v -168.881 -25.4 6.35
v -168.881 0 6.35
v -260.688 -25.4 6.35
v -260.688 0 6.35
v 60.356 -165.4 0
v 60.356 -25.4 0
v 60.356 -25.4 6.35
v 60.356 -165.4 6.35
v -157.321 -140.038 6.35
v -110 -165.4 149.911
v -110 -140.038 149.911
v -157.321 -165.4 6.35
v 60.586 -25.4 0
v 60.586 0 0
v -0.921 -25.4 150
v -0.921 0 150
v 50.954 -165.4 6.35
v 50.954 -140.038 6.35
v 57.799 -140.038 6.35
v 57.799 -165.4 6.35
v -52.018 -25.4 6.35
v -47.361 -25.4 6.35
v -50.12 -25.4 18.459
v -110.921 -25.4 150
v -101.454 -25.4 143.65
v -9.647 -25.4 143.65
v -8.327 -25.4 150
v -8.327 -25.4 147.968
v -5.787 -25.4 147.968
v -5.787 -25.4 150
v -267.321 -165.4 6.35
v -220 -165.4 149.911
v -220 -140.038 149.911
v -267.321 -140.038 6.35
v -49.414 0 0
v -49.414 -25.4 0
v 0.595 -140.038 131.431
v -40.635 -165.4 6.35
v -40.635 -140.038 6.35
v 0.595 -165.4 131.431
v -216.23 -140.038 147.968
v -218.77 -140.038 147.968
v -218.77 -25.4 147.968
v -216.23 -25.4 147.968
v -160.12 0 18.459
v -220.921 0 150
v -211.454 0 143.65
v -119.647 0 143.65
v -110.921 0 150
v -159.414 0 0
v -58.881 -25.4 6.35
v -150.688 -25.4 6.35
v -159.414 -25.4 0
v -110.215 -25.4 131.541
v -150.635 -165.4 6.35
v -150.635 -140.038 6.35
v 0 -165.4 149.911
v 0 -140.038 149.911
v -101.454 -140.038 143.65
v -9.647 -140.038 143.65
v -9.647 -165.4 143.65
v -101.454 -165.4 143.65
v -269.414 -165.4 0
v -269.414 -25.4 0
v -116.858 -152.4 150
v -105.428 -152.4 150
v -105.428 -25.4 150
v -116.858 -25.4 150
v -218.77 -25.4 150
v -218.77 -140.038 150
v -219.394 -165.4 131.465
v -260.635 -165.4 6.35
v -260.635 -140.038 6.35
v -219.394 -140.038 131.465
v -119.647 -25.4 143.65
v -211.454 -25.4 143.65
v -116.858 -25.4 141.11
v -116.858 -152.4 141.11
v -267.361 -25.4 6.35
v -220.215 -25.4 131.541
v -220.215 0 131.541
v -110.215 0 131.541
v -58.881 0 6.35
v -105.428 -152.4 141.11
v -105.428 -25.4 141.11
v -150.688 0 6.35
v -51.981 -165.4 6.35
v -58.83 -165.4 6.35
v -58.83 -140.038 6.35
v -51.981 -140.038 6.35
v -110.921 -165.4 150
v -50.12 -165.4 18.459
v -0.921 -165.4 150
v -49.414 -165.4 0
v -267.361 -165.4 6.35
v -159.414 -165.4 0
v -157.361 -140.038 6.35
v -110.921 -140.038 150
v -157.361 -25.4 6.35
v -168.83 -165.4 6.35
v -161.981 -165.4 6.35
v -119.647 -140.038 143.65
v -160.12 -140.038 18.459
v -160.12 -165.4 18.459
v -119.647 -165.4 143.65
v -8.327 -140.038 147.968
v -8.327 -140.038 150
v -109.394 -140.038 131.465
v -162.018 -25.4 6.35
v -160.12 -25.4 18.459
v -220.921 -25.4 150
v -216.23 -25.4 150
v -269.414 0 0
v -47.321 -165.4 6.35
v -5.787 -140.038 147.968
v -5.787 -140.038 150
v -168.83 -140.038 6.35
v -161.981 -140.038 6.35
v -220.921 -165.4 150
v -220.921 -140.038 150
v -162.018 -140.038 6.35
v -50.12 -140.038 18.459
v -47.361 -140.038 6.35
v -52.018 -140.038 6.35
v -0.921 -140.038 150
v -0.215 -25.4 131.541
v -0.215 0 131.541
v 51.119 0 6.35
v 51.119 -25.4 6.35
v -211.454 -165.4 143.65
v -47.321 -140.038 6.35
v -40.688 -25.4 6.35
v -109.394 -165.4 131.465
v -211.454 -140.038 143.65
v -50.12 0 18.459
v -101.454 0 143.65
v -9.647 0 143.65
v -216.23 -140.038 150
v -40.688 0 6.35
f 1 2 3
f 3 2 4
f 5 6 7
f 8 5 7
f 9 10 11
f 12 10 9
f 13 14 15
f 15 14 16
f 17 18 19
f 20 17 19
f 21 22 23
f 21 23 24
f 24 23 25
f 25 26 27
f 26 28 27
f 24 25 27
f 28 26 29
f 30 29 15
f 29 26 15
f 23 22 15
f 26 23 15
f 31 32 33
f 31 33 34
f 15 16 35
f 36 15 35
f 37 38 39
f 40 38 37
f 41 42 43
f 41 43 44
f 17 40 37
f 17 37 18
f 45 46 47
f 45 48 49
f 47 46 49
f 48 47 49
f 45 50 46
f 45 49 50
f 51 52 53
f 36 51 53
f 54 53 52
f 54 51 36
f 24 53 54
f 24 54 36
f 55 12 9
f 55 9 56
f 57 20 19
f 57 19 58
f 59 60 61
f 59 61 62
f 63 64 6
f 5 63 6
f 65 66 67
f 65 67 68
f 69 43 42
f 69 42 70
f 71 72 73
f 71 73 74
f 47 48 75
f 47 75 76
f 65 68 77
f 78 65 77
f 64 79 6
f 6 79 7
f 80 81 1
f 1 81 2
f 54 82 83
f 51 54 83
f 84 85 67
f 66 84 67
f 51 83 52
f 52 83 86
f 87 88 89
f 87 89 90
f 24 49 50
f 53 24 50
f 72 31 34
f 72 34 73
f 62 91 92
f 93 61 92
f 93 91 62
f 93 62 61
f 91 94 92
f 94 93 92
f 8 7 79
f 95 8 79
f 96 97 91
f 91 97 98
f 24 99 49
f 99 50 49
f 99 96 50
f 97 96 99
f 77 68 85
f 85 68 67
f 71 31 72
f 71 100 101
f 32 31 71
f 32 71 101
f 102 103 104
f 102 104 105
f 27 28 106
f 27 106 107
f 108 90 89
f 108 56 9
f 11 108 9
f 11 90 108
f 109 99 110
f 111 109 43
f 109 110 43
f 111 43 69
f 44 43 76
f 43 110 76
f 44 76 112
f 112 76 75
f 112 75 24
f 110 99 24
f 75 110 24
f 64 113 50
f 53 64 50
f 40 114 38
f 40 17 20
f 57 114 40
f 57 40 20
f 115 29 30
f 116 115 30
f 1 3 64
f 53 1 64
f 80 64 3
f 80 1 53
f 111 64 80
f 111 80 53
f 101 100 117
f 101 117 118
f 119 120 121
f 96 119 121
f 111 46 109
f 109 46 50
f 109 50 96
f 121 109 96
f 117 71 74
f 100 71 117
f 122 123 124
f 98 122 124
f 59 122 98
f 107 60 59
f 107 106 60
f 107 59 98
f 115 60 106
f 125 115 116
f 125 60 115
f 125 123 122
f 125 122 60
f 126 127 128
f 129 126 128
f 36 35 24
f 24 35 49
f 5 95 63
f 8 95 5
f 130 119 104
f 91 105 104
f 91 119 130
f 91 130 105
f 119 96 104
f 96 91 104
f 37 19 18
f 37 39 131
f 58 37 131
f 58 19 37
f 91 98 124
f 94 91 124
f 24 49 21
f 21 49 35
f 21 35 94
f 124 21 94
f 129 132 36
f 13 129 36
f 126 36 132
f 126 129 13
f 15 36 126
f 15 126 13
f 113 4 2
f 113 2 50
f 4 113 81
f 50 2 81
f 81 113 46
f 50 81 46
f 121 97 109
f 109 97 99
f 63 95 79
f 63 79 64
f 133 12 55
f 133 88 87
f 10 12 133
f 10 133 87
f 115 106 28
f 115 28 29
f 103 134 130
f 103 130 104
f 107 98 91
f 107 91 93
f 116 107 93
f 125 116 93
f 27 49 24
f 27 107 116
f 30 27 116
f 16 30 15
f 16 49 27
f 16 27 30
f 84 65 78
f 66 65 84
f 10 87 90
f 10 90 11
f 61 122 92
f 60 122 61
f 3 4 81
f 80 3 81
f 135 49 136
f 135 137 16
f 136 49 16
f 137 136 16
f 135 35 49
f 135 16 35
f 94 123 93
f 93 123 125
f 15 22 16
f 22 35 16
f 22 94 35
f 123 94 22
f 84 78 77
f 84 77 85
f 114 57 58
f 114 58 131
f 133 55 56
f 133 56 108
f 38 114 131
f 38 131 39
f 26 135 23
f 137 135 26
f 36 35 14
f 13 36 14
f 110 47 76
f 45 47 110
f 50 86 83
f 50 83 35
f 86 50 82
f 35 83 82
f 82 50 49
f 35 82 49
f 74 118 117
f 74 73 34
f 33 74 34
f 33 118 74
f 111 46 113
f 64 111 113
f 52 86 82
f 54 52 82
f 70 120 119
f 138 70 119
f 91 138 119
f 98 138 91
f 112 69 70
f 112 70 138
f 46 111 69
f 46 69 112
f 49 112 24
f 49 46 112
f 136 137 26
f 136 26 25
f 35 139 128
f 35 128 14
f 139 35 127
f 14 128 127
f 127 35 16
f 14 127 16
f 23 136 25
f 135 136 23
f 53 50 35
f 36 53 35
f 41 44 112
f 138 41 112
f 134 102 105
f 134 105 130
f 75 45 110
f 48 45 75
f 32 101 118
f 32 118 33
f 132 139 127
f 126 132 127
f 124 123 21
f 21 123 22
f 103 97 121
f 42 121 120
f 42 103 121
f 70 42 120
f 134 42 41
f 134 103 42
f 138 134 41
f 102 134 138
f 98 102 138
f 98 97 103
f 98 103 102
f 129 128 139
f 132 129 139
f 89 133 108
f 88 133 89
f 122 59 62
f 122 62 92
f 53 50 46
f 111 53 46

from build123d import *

# Parameters (mm, degrees)
F1_DEPTH  = 25.4
F3_DEPTH  = 140
F5_DEPTH  = 25.4
F6_DEPTH  = 165.4
F7_T      = -6.35
F7_2_T    = -6.35
F8_W      = 114.6380283594
F8_H      = 145.7706200123
F9_DEPTH  = 333
F10_W     = 2.54
F10_H     = 2.032
F11_DEPTH = 127
F13_DEPTH = 127
F14_W     = 2.54
F14_H     = 2.032
F15_DEPTH = 127


with BuildPart() as f1:
    # F0 (on Front) → F1 (new body)
    with BuildSketch(Plane.XZ):
        Polygon((-220.9205039681, 150), (-269.4142203802, 0), (-159.4142203802, 0), align=None)
        Polygon((-260.6877224035, 6.35), (-220.2145848766, 131.5408716885), (-168.8810831653, 6.35), align=None, mode=Mode.SUBTRACT)
    extrude(amount=F1_DEPTH)


with BuildPart() as f1b:
    # F0 (on Front) → F1, piece 2 (new body)
    with BuildSketch(Plane.XZ):
        Polygon((-110.9205039681, 150), (-159.4142203802, 0), (-49.4142203802, 0), align=None)
        Polygon((-58.8810831653, 6.35), (-150.6877224035, 6.35), (-110.2145848766, 131.5408716885), align=None, mode=Mode.SUBTRACT)
    extrude(amount=F1_DEPTH)


with BuildPart() as f1c:
    # F0 (on Front) → F1, piece 3 (new body)
    with BuildSketch(Plane.XZ):
        Polygon((-0.9205039681, 150), (-49.4142203802, 0), (60.5857796198, 0), align=None)
        Polygon((-40.6877224035, 6.35), (-0.2145848766, 131.5408716885), (51.1189168347, 6.35), align=None, mode=Mode.SUBTRACT)
    extrude(amount=F1_DEPTH)


with BuildPart() as f3:
    # F2 (on face) → F3 (new body)
    with BuildSketch(Plane.XZ.offset(25.4)):
        Polygon((-267.3613197188, 6.35), (-269.4142203802, 0), (-159.4142203802, 0), (-162.0179863854, 6.35), (-168.8810831653, 6.35), (-260.6877224035, 6.35), align=None)
        Polygon((-162.0179863854, 6.35), (-159.4142203802, 0), (60.3559166193, 0), (60.3559166193, 6.35), align=None)
    extrude(amount=F3_DEPTH)


with BuildPart() as f5:
    # F4 (on face) → F5 (new body)
    with BuildSketch(Plane.XZ.offset(165.4)):
        Polygon((-220, 149.9108), (-267.3211070127, 6.35), (-260.6350301683, 6.35), (-219.3941436498, 131.4648807595), (-168.829523937, 6.35), (-161.9805444915, 6.35), align=None)
    extrude(amount=-F5_DEPTH)


with BuildPart() as f5b:
    # F4 (on face) → F5, piece 2 (new body)
    with BuildSketch(Plane.XZ.offset(165.4)):
        Polygon((-110, 149.9108), (-157.3211070127, 6.35), (-150.6350301683, 6.35), (-109.3941436498, 131.4648807595), (-58.829523937, 6.35), (-51.9805444915, 6.35), align=None)
    extrude(amount=-F5_DEPTH)


with BuildPart() as f5c:
    # F4 (on face) → F5, piece 3 (new body)
    with BuildSketch(Plane.XZ.offset(165.4)):
        Polygon((0, 149.9108), (-47.3211070127, 6.35), (-40.6350301683, 6.35), (0.5947637896, 131.431228612), (50.953992109, 6.35), (57.7993291651, 6.35), align=None)
    extrude(amount=-F5_DEPTH)


with BuildPart() as f6:
    # F0 (on Front) → F6 (new body, through all)
    with BuildSketch(Plane.XZ):
        Polygon((-110.9205039681, 150), (-220.9205039681, 150), (-159.4142203802, 0), align=None)
    extrude(amount=F6_DEPTH)

    # F7
    f7_openings = [f6.faces().sort_by_distance(p)[0] for p in [
        (-163.751743, -165.4, 100),
        (-163.751743, 0, 100),
    ]]
    offset(amount=F7_T, openings=f7_openings)


with BuildPart() as f6b:
    # F0 (on Front) → F6, piece 2 (new body, through all)
    with BuildSketch(Plane.XZ):
        Polygon((-0.9205039681, 150), (-110.9205039681, 150), (-49.4142203802, 0), align=None)
    extrude(amount=F6_DEPTH)

    # F7#2
    f7_2_openings = [f6b.faces().sort_by_distance(p)[0] for p in [
        (-53.751743, -165.4, 100),
        (-53.751743, 0, 100),
    ]]
    offset(amount=F7_2_T, openings=f7_2_openings)


with BuildPart() as f9_tool:
    # F8 (on face) → F9 (new body)
    with BuildSketch(Plane.YZ.offset(60.3559166193)):
        with Locations((-82.7190141797, 79.2353100061)):
            Rectangle(F8_W, F8_H)
    extrude(amount=-F9_DEPTH)


with BuildPart() as f5_1:
    add(f5.part)

    # F9: cut by f9_tool
    add(f9_tool.part, mode=Mode.SUBTRACT)


with BuildPart() as f5b_1:
    add(f5b.part)

    # F9: cut by f9_tool
    add(f9_tool.part, mode=Mode.SUBTRACT)


with BuildPart() as f5c_1:
    add(f5c.part)

    # F9: cut by f9_tool
    add(f9_tool.part, mode=Mode.SUBTRACT)


with BuildPart() as f6_1:
    add(f6.part)

    # F9: cut by f9_tool
    add(f9_tool.part, mode=Mode.SUBTRACT)

    # F10 (on face) → F11 (join)
    with BuildSketch(Plane.XZ.offset(25.4)):
        with Locations((-217.5002208757, 148.984)):
            Rectangle(F10_W, F10_H)
    extrude(amount=F11_DEPTH)


with BuildPart() as f6b_1:
    add(f6b.part)

    # F9: cut by f9_tool
    add(f9_tool.part, mode=Mode.SUBTRACT)

    # F14 (on face) → F15 (join)
    with BuildSketch(Plane.XZ.offset(25.4)):
        with Locations((-7.0570147443, 148.984)):
            Rectangle(F14_W, F14_H)
    extrude(amount=F15_DEPTH)


with BuildPart() as f13:
    # F12 (on face) → F13 (new body)
    with BuildSketch(Plane.XZ.offset(25.4)):
        Polygon((-110.9205039681, 150), (-116.8577745557, 150), (-116.8577745557, 141.11), (-113.7945648941, 141.11), align=None)
        Polygon((-105.4277745557, 150), (-110.9205039681, 150), (-113.7945648941, 141.11), (-105.4277745557, 141.11), align=None)
    extrude(amount=F13_DEPTH)


solid = Compound([f1.part, f1b.part, f1c.part, f3.part, f5_1.part, f5b_1.part, f5c_1.part, f6_1.part, f6b_1.part, f13.part])
